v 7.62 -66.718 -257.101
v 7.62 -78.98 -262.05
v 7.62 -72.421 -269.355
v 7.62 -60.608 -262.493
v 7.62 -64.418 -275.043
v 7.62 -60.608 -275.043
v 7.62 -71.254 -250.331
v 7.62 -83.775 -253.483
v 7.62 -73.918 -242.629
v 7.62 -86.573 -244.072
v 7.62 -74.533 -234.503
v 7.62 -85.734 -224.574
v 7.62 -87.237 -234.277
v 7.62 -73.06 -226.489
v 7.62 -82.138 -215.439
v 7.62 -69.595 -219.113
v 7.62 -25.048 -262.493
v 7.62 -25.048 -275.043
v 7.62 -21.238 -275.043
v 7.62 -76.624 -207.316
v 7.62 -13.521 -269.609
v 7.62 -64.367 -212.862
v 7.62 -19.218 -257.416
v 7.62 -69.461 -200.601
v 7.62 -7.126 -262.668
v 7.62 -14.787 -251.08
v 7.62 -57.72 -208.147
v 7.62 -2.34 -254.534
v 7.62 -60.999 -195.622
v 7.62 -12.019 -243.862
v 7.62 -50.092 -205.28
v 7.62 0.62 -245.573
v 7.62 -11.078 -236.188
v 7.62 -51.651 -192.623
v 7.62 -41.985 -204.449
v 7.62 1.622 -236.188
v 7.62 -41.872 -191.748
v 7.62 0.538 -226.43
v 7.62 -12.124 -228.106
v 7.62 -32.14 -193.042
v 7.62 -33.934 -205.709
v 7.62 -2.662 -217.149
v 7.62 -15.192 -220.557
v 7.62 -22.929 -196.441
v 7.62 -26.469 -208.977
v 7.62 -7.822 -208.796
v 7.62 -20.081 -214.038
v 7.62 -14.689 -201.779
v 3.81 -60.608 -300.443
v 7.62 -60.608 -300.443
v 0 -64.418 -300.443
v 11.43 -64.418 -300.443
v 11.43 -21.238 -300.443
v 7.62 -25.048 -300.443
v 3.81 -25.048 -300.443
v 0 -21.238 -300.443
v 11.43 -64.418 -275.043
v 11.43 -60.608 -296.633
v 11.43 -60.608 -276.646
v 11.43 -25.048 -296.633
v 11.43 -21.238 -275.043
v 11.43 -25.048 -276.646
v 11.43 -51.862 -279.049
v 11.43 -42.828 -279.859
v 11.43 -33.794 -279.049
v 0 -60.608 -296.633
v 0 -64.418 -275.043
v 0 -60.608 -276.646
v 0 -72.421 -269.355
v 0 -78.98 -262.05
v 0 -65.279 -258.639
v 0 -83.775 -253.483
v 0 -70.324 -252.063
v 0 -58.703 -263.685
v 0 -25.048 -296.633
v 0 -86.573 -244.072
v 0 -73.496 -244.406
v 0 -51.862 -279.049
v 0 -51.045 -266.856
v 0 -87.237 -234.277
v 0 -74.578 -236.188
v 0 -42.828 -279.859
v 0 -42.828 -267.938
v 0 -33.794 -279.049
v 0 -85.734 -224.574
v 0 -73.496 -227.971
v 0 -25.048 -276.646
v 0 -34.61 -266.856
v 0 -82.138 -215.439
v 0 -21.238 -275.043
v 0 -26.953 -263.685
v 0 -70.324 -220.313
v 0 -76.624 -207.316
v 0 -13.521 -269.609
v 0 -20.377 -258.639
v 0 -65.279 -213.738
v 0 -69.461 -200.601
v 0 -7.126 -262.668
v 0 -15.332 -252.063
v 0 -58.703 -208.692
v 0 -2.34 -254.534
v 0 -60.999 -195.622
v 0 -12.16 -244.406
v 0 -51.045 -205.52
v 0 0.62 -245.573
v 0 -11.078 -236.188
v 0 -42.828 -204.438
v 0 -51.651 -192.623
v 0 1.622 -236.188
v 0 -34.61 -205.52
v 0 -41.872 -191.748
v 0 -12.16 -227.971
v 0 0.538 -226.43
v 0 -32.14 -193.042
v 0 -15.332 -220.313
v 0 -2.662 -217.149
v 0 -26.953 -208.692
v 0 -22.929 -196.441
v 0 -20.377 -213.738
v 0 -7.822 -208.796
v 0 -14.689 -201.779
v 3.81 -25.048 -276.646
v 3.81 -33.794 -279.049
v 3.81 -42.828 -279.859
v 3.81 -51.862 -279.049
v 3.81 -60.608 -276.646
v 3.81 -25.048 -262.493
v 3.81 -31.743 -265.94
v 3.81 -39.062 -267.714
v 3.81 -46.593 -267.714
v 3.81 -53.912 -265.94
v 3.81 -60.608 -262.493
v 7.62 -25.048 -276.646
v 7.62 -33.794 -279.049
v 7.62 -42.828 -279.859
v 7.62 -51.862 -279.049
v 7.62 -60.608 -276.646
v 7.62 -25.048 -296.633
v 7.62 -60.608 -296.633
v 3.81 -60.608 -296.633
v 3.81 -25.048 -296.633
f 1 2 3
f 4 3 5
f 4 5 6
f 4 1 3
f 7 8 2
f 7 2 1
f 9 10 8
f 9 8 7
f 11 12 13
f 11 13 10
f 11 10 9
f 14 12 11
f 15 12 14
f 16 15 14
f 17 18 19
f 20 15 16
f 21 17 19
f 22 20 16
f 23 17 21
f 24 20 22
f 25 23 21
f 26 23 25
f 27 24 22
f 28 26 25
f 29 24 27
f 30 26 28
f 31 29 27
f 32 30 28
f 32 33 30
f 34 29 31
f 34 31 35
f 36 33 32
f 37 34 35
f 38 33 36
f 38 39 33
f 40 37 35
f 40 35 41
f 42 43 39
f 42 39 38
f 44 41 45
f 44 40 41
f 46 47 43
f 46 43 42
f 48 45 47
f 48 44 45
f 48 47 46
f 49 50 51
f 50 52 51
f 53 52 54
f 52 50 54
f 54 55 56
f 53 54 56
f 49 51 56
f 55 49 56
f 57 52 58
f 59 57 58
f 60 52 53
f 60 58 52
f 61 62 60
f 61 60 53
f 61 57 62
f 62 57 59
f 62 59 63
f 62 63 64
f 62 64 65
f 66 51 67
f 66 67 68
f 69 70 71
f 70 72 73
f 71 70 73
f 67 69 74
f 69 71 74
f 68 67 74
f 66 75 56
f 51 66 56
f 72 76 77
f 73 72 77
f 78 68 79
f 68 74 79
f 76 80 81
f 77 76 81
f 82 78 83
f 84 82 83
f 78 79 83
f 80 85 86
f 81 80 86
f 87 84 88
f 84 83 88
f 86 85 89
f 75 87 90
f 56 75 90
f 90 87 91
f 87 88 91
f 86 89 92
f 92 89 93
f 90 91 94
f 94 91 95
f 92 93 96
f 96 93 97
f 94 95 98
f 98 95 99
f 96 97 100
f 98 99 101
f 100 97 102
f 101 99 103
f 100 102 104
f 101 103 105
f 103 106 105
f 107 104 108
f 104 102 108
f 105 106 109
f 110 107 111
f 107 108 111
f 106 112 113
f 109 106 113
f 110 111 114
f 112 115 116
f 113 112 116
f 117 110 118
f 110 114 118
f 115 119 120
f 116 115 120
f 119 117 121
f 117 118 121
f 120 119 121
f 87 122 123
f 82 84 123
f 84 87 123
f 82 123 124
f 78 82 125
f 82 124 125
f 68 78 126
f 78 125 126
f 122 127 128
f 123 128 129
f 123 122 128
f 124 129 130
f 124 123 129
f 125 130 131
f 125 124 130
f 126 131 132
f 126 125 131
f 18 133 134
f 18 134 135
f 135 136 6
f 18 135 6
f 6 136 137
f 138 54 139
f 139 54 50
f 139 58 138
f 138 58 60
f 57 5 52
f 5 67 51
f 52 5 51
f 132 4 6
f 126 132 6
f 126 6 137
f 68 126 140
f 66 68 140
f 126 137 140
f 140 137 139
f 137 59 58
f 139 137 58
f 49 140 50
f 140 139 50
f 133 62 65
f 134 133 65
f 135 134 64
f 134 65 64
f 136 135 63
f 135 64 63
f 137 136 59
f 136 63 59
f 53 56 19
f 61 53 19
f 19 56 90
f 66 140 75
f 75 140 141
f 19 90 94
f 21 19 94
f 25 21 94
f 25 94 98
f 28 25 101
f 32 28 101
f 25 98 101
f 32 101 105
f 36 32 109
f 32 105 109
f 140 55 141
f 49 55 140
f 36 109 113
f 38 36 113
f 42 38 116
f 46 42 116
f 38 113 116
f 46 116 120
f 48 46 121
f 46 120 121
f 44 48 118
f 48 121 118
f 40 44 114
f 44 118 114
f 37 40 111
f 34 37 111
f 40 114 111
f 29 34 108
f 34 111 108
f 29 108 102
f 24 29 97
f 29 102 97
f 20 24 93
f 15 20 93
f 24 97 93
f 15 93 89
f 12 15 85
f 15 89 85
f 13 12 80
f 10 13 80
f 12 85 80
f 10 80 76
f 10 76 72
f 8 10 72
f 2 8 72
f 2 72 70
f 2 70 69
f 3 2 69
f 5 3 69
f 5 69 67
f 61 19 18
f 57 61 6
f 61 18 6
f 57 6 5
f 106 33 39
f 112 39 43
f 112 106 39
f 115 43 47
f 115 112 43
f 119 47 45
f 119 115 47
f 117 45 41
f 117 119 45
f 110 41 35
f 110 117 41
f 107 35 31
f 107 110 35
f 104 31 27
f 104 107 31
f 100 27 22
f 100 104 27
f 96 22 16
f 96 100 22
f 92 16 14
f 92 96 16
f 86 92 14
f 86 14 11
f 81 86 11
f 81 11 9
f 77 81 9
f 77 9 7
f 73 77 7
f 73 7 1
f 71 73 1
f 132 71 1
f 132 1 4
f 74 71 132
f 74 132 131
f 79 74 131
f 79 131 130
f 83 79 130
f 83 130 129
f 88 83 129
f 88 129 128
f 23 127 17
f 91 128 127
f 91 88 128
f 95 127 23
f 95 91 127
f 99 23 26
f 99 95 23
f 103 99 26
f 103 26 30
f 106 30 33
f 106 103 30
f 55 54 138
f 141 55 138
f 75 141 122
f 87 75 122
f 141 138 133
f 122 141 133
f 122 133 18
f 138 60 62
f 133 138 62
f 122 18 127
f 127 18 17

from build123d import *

# Parameters (mm, degrees)
F1_DEPTH = 11.43
F0_R     = 31.75
F4_DEPTH = 7.62
F2_W     = 3.81
F2_H     = 35.56
F5_DEPTH = 76.2
F6_DEPTH = 76.2


with BuildPart() as f1:
    # F0 (on Right) → F1 (new body)
    with BuildSketch(Plane.YZ):
        with BuildLine():
            Line((-21.237904, -275.042741), (-64.417904, -275.042741))
            ThreePointArc((-64.417904, -275.042741), (-42.827904, -280.638212), (-21.237904, -275.042741))
        make_face()
        with BuildLine():
            ThreePointArc((-21.237904, -275.042741), (-42.827904, -280.638212), (-64.417904, -275.042741))
            Line((-64.417904, -275.042741), (-64.417904, -300.442741))
            Line((-64.417904, -300.442741), (-21.237904, -300.442741))
            Line((-21.237904, -300.442741), (-21.237904, -275.042741))
        make_face()
    extrude(amount=F1_DEPTH)

    # F0 (on Right) → F4 (join)
    with BuildSketch(Plane.YZ):
        with BuildLine():
            ThreePointArc((-21.237904, -275.042741), (-4.516822, -258.728476), (1.622096, -236.188212))
            ThreePointArc((1.622096, -236.188212), (-65.368168, -197.87713), (-64.417904, -275.042741))
            Line((-64.417904, -275.042741), (-21.237904, -275.042741))
        make_face()
        with Locations((-42.827904, -236.188212)):
            Circle(F0_R, mode=Mode.SUBTRACT)
    extrude(amount=F4_DEPTH)

    # F2 (on face) → F5 (cut)
    with BuildSketch(Plane(origin=(0, 0, -300.442741), x_dir=(1, 0, 0), z_dir=(0, 0, -1))):
        with Locations((5.715, 42.827904)):
            Rectangle(F2_W, F2_H)
    extrude(amount=-F5_DEPTH, mode=Mode.SUBTRACT)

    # F3 (on face) → F6 (cut)
    with BuildSketch(Plane.YZ.offset(11.43)):
        with BuildLine():
            Line((-60.607904, -276.645803), (-60.607904, -296.632741))
            Line((-60.607904, -296.632741), (-25.047904, -296.632741))
            Line((-25.047904, -296.632741), (-25.047904, -276.645803))
            ThreePointArc((-25.047904, -276.645803), (-42.827904, -279.858919), (-60.607904, -276.645803))
        make_face()
    extrude(amount=-F6_DEPTH, mode=Mode.SUBTRACT)


solid = f1.part
